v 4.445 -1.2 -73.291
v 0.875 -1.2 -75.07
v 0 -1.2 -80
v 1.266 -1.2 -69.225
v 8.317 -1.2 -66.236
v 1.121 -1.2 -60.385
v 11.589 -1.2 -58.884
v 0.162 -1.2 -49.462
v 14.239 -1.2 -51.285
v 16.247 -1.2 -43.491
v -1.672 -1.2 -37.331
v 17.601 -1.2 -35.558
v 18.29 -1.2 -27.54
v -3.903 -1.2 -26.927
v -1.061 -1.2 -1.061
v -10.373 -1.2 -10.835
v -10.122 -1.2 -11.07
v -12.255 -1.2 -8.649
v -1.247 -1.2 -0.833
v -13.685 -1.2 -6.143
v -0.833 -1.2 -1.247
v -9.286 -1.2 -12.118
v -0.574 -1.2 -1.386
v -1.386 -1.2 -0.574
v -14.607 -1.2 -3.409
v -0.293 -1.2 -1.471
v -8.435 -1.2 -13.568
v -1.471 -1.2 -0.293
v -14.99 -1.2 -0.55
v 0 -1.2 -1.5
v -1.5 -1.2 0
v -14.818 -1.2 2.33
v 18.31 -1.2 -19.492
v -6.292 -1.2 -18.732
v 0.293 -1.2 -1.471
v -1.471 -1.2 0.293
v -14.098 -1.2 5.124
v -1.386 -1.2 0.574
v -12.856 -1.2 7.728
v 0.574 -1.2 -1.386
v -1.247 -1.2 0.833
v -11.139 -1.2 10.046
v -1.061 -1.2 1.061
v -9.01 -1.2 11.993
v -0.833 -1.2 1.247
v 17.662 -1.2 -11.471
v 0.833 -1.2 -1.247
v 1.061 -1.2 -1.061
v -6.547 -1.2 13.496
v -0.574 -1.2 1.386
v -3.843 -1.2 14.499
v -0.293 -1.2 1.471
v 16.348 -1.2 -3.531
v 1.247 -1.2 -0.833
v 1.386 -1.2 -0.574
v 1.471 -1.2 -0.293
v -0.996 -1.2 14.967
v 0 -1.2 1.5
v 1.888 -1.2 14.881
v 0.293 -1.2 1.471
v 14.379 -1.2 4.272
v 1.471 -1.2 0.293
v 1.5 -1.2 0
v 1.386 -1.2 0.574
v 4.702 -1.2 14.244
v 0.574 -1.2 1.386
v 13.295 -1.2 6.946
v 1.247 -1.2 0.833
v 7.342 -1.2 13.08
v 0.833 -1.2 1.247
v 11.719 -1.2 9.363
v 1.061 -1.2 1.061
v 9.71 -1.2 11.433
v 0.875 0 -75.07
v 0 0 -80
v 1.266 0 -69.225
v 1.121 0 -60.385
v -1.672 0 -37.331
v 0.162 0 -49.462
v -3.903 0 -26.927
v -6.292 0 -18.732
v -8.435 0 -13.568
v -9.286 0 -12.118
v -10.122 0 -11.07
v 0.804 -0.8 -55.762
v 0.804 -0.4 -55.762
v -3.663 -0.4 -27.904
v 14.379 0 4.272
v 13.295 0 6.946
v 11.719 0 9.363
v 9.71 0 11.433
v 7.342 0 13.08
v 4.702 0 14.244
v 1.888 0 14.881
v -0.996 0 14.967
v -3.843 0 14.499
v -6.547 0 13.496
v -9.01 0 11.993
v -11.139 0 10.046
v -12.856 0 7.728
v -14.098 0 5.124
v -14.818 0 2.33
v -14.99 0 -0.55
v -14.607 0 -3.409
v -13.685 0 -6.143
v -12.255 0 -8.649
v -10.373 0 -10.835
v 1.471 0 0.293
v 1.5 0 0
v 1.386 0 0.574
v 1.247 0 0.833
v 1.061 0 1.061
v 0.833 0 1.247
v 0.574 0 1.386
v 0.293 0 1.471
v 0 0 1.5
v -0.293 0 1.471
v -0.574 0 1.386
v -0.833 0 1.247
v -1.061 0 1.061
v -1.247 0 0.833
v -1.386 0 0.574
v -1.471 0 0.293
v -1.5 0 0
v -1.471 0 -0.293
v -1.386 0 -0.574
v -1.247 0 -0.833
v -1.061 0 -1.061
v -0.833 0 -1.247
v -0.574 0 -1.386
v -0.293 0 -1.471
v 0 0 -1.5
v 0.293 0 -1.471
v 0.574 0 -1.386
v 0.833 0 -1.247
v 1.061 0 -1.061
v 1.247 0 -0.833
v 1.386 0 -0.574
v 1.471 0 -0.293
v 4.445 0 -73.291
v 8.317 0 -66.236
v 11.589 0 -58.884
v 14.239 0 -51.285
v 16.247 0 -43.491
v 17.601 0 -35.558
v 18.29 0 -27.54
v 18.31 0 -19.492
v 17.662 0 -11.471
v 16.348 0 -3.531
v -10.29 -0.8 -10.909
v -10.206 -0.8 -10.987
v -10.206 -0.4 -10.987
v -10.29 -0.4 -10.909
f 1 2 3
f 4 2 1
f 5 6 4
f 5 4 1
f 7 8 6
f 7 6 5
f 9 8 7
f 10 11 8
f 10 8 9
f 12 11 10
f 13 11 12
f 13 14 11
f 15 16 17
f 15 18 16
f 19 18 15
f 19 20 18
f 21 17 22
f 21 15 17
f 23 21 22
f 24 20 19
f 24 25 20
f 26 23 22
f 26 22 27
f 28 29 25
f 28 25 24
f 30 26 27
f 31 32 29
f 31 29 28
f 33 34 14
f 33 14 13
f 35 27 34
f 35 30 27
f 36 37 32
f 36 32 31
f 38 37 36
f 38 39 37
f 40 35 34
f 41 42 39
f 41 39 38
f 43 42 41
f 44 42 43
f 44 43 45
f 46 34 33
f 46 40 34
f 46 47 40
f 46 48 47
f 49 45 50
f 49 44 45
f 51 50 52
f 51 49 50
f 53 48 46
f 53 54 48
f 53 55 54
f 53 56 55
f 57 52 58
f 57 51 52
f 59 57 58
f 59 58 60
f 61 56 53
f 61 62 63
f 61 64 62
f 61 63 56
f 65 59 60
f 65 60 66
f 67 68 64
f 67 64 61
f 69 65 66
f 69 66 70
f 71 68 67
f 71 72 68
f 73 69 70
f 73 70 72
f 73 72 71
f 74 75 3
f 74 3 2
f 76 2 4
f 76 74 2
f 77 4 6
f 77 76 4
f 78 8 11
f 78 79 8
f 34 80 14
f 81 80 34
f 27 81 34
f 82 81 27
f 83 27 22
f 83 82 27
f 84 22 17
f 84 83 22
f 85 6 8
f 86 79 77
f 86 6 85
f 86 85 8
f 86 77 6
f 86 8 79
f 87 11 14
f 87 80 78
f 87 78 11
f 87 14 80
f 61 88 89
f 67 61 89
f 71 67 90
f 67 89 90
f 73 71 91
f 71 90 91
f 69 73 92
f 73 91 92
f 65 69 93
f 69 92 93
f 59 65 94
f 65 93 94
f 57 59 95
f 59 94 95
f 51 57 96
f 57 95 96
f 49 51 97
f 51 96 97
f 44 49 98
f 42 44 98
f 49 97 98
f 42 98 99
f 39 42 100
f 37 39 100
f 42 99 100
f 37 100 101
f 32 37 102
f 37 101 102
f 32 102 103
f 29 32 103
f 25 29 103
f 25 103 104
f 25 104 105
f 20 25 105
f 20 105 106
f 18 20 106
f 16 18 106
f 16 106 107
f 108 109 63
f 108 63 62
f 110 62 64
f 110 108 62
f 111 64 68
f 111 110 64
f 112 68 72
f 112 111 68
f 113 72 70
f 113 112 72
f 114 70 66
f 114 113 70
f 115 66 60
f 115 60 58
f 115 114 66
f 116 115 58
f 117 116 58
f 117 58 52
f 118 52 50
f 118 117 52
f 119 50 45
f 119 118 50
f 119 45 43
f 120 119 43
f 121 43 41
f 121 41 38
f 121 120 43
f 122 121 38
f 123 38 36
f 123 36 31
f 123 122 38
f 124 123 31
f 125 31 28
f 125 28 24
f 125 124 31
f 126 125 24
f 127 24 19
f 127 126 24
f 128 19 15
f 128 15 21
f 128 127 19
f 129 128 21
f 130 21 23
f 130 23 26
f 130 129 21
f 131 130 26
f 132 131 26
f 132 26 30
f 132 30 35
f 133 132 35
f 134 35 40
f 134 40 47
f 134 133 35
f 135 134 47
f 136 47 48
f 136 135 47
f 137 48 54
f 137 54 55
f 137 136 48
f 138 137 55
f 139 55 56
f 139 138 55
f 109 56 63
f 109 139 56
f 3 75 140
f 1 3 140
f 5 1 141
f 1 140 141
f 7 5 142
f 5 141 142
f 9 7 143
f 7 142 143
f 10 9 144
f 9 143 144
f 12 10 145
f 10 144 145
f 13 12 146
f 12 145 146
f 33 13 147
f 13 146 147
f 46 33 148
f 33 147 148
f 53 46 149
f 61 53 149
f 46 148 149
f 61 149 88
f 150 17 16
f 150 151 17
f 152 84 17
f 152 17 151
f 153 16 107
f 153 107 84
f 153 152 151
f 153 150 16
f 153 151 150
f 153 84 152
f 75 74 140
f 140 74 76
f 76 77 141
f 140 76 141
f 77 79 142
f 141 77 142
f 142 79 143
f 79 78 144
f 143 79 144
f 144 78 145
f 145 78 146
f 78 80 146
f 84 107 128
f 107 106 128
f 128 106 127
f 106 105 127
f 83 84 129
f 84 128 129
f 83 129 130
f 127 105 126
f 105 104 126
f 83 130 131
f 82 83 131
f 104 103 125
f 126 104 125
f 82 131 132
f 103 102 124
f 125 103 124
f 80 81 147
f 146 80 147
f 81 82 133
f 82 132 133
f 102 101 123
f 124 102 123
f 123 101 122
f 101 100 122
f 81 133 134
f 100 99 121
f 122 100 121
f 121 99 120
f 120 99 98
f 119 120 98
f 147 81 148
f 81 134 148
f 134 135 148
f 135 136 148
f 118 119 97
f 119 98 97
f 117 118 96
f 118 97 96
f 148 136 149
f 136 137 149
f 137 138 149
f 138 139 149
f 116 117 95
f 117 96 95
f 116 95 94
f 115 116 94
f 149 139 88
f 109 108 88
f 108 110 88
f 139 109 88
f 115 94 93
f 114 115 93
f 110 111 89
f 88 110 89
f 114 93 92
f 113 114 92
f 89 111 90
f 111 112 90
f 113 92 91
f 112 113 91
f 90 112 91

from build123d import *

# Parameters (mm, degrees)
F0_R     = 1.5
F1_DEPTH = 1.2


# Not quite as in the source:
# - a feature names something its author has since deleted; it is built from what else it names


with BuildPart() as f1:
    # F0 (on Front) → F1 (new body)
    with BuildSketch(Plane.XZ):
        with BuildLine():
            ThreePointArc((-10.1224102731, -11.0696346038), (6.0482991784, -13.7265464356), (15, 0))
            ThreePointArc((15, 0), (14.8438679143, 2.1586072693), (14.3787219542, 4.2722774913))
            ThreePointArc((14.3787219542, 4.2722774913), (-7.8146967903, 12.8035352179), (-10.3730753026, -10.8350961587))
            add(Edge.make_bspline(
                [(-10.1224102731, -11.0696346038), (-10.2063109594, -10.9847137567), (-10.2898772286, -10.9064839504), (-10.3730753026, -10.8350961587)],
                knots=[69.0284339282, 69.0284339282, 69.0284339282, 69.0284339282, 69.9384344593, 69.9384344593, 69.9384344593, 69.9384344593], degree=3))
        make_face()
        Circle(F0_R, mode=Mode.SUBTRACT)
        with BuildLine():
            ThreePointArc((14.3787219542, 4.2722774913), (14.8438679143, 2.1586072693), (15, 0))
            ThreePointArc((15, 0), (6.0482991784, -13.7265464356), (-10.1224102731, -11.0696346038))
            add(Edge.make_bspline(
                [(0, -80), (4.5304750858, -62.4535454421), (-3.758092031, -17.5113375297), (-10.1224102731, -11.0696346038)],
                knots=[0, 0, 0, 0, 69.0284339282, 69.0284339282, 69.0284339282, 69.0284339282], degree=3))
            ThreePointArc((0, -80), (17.0066443872, -39.5389078142), (14.3787219542, 4.2722774913))
        make_face()
    extrude(amount=F1_DEPTH)


solid = f1.part
